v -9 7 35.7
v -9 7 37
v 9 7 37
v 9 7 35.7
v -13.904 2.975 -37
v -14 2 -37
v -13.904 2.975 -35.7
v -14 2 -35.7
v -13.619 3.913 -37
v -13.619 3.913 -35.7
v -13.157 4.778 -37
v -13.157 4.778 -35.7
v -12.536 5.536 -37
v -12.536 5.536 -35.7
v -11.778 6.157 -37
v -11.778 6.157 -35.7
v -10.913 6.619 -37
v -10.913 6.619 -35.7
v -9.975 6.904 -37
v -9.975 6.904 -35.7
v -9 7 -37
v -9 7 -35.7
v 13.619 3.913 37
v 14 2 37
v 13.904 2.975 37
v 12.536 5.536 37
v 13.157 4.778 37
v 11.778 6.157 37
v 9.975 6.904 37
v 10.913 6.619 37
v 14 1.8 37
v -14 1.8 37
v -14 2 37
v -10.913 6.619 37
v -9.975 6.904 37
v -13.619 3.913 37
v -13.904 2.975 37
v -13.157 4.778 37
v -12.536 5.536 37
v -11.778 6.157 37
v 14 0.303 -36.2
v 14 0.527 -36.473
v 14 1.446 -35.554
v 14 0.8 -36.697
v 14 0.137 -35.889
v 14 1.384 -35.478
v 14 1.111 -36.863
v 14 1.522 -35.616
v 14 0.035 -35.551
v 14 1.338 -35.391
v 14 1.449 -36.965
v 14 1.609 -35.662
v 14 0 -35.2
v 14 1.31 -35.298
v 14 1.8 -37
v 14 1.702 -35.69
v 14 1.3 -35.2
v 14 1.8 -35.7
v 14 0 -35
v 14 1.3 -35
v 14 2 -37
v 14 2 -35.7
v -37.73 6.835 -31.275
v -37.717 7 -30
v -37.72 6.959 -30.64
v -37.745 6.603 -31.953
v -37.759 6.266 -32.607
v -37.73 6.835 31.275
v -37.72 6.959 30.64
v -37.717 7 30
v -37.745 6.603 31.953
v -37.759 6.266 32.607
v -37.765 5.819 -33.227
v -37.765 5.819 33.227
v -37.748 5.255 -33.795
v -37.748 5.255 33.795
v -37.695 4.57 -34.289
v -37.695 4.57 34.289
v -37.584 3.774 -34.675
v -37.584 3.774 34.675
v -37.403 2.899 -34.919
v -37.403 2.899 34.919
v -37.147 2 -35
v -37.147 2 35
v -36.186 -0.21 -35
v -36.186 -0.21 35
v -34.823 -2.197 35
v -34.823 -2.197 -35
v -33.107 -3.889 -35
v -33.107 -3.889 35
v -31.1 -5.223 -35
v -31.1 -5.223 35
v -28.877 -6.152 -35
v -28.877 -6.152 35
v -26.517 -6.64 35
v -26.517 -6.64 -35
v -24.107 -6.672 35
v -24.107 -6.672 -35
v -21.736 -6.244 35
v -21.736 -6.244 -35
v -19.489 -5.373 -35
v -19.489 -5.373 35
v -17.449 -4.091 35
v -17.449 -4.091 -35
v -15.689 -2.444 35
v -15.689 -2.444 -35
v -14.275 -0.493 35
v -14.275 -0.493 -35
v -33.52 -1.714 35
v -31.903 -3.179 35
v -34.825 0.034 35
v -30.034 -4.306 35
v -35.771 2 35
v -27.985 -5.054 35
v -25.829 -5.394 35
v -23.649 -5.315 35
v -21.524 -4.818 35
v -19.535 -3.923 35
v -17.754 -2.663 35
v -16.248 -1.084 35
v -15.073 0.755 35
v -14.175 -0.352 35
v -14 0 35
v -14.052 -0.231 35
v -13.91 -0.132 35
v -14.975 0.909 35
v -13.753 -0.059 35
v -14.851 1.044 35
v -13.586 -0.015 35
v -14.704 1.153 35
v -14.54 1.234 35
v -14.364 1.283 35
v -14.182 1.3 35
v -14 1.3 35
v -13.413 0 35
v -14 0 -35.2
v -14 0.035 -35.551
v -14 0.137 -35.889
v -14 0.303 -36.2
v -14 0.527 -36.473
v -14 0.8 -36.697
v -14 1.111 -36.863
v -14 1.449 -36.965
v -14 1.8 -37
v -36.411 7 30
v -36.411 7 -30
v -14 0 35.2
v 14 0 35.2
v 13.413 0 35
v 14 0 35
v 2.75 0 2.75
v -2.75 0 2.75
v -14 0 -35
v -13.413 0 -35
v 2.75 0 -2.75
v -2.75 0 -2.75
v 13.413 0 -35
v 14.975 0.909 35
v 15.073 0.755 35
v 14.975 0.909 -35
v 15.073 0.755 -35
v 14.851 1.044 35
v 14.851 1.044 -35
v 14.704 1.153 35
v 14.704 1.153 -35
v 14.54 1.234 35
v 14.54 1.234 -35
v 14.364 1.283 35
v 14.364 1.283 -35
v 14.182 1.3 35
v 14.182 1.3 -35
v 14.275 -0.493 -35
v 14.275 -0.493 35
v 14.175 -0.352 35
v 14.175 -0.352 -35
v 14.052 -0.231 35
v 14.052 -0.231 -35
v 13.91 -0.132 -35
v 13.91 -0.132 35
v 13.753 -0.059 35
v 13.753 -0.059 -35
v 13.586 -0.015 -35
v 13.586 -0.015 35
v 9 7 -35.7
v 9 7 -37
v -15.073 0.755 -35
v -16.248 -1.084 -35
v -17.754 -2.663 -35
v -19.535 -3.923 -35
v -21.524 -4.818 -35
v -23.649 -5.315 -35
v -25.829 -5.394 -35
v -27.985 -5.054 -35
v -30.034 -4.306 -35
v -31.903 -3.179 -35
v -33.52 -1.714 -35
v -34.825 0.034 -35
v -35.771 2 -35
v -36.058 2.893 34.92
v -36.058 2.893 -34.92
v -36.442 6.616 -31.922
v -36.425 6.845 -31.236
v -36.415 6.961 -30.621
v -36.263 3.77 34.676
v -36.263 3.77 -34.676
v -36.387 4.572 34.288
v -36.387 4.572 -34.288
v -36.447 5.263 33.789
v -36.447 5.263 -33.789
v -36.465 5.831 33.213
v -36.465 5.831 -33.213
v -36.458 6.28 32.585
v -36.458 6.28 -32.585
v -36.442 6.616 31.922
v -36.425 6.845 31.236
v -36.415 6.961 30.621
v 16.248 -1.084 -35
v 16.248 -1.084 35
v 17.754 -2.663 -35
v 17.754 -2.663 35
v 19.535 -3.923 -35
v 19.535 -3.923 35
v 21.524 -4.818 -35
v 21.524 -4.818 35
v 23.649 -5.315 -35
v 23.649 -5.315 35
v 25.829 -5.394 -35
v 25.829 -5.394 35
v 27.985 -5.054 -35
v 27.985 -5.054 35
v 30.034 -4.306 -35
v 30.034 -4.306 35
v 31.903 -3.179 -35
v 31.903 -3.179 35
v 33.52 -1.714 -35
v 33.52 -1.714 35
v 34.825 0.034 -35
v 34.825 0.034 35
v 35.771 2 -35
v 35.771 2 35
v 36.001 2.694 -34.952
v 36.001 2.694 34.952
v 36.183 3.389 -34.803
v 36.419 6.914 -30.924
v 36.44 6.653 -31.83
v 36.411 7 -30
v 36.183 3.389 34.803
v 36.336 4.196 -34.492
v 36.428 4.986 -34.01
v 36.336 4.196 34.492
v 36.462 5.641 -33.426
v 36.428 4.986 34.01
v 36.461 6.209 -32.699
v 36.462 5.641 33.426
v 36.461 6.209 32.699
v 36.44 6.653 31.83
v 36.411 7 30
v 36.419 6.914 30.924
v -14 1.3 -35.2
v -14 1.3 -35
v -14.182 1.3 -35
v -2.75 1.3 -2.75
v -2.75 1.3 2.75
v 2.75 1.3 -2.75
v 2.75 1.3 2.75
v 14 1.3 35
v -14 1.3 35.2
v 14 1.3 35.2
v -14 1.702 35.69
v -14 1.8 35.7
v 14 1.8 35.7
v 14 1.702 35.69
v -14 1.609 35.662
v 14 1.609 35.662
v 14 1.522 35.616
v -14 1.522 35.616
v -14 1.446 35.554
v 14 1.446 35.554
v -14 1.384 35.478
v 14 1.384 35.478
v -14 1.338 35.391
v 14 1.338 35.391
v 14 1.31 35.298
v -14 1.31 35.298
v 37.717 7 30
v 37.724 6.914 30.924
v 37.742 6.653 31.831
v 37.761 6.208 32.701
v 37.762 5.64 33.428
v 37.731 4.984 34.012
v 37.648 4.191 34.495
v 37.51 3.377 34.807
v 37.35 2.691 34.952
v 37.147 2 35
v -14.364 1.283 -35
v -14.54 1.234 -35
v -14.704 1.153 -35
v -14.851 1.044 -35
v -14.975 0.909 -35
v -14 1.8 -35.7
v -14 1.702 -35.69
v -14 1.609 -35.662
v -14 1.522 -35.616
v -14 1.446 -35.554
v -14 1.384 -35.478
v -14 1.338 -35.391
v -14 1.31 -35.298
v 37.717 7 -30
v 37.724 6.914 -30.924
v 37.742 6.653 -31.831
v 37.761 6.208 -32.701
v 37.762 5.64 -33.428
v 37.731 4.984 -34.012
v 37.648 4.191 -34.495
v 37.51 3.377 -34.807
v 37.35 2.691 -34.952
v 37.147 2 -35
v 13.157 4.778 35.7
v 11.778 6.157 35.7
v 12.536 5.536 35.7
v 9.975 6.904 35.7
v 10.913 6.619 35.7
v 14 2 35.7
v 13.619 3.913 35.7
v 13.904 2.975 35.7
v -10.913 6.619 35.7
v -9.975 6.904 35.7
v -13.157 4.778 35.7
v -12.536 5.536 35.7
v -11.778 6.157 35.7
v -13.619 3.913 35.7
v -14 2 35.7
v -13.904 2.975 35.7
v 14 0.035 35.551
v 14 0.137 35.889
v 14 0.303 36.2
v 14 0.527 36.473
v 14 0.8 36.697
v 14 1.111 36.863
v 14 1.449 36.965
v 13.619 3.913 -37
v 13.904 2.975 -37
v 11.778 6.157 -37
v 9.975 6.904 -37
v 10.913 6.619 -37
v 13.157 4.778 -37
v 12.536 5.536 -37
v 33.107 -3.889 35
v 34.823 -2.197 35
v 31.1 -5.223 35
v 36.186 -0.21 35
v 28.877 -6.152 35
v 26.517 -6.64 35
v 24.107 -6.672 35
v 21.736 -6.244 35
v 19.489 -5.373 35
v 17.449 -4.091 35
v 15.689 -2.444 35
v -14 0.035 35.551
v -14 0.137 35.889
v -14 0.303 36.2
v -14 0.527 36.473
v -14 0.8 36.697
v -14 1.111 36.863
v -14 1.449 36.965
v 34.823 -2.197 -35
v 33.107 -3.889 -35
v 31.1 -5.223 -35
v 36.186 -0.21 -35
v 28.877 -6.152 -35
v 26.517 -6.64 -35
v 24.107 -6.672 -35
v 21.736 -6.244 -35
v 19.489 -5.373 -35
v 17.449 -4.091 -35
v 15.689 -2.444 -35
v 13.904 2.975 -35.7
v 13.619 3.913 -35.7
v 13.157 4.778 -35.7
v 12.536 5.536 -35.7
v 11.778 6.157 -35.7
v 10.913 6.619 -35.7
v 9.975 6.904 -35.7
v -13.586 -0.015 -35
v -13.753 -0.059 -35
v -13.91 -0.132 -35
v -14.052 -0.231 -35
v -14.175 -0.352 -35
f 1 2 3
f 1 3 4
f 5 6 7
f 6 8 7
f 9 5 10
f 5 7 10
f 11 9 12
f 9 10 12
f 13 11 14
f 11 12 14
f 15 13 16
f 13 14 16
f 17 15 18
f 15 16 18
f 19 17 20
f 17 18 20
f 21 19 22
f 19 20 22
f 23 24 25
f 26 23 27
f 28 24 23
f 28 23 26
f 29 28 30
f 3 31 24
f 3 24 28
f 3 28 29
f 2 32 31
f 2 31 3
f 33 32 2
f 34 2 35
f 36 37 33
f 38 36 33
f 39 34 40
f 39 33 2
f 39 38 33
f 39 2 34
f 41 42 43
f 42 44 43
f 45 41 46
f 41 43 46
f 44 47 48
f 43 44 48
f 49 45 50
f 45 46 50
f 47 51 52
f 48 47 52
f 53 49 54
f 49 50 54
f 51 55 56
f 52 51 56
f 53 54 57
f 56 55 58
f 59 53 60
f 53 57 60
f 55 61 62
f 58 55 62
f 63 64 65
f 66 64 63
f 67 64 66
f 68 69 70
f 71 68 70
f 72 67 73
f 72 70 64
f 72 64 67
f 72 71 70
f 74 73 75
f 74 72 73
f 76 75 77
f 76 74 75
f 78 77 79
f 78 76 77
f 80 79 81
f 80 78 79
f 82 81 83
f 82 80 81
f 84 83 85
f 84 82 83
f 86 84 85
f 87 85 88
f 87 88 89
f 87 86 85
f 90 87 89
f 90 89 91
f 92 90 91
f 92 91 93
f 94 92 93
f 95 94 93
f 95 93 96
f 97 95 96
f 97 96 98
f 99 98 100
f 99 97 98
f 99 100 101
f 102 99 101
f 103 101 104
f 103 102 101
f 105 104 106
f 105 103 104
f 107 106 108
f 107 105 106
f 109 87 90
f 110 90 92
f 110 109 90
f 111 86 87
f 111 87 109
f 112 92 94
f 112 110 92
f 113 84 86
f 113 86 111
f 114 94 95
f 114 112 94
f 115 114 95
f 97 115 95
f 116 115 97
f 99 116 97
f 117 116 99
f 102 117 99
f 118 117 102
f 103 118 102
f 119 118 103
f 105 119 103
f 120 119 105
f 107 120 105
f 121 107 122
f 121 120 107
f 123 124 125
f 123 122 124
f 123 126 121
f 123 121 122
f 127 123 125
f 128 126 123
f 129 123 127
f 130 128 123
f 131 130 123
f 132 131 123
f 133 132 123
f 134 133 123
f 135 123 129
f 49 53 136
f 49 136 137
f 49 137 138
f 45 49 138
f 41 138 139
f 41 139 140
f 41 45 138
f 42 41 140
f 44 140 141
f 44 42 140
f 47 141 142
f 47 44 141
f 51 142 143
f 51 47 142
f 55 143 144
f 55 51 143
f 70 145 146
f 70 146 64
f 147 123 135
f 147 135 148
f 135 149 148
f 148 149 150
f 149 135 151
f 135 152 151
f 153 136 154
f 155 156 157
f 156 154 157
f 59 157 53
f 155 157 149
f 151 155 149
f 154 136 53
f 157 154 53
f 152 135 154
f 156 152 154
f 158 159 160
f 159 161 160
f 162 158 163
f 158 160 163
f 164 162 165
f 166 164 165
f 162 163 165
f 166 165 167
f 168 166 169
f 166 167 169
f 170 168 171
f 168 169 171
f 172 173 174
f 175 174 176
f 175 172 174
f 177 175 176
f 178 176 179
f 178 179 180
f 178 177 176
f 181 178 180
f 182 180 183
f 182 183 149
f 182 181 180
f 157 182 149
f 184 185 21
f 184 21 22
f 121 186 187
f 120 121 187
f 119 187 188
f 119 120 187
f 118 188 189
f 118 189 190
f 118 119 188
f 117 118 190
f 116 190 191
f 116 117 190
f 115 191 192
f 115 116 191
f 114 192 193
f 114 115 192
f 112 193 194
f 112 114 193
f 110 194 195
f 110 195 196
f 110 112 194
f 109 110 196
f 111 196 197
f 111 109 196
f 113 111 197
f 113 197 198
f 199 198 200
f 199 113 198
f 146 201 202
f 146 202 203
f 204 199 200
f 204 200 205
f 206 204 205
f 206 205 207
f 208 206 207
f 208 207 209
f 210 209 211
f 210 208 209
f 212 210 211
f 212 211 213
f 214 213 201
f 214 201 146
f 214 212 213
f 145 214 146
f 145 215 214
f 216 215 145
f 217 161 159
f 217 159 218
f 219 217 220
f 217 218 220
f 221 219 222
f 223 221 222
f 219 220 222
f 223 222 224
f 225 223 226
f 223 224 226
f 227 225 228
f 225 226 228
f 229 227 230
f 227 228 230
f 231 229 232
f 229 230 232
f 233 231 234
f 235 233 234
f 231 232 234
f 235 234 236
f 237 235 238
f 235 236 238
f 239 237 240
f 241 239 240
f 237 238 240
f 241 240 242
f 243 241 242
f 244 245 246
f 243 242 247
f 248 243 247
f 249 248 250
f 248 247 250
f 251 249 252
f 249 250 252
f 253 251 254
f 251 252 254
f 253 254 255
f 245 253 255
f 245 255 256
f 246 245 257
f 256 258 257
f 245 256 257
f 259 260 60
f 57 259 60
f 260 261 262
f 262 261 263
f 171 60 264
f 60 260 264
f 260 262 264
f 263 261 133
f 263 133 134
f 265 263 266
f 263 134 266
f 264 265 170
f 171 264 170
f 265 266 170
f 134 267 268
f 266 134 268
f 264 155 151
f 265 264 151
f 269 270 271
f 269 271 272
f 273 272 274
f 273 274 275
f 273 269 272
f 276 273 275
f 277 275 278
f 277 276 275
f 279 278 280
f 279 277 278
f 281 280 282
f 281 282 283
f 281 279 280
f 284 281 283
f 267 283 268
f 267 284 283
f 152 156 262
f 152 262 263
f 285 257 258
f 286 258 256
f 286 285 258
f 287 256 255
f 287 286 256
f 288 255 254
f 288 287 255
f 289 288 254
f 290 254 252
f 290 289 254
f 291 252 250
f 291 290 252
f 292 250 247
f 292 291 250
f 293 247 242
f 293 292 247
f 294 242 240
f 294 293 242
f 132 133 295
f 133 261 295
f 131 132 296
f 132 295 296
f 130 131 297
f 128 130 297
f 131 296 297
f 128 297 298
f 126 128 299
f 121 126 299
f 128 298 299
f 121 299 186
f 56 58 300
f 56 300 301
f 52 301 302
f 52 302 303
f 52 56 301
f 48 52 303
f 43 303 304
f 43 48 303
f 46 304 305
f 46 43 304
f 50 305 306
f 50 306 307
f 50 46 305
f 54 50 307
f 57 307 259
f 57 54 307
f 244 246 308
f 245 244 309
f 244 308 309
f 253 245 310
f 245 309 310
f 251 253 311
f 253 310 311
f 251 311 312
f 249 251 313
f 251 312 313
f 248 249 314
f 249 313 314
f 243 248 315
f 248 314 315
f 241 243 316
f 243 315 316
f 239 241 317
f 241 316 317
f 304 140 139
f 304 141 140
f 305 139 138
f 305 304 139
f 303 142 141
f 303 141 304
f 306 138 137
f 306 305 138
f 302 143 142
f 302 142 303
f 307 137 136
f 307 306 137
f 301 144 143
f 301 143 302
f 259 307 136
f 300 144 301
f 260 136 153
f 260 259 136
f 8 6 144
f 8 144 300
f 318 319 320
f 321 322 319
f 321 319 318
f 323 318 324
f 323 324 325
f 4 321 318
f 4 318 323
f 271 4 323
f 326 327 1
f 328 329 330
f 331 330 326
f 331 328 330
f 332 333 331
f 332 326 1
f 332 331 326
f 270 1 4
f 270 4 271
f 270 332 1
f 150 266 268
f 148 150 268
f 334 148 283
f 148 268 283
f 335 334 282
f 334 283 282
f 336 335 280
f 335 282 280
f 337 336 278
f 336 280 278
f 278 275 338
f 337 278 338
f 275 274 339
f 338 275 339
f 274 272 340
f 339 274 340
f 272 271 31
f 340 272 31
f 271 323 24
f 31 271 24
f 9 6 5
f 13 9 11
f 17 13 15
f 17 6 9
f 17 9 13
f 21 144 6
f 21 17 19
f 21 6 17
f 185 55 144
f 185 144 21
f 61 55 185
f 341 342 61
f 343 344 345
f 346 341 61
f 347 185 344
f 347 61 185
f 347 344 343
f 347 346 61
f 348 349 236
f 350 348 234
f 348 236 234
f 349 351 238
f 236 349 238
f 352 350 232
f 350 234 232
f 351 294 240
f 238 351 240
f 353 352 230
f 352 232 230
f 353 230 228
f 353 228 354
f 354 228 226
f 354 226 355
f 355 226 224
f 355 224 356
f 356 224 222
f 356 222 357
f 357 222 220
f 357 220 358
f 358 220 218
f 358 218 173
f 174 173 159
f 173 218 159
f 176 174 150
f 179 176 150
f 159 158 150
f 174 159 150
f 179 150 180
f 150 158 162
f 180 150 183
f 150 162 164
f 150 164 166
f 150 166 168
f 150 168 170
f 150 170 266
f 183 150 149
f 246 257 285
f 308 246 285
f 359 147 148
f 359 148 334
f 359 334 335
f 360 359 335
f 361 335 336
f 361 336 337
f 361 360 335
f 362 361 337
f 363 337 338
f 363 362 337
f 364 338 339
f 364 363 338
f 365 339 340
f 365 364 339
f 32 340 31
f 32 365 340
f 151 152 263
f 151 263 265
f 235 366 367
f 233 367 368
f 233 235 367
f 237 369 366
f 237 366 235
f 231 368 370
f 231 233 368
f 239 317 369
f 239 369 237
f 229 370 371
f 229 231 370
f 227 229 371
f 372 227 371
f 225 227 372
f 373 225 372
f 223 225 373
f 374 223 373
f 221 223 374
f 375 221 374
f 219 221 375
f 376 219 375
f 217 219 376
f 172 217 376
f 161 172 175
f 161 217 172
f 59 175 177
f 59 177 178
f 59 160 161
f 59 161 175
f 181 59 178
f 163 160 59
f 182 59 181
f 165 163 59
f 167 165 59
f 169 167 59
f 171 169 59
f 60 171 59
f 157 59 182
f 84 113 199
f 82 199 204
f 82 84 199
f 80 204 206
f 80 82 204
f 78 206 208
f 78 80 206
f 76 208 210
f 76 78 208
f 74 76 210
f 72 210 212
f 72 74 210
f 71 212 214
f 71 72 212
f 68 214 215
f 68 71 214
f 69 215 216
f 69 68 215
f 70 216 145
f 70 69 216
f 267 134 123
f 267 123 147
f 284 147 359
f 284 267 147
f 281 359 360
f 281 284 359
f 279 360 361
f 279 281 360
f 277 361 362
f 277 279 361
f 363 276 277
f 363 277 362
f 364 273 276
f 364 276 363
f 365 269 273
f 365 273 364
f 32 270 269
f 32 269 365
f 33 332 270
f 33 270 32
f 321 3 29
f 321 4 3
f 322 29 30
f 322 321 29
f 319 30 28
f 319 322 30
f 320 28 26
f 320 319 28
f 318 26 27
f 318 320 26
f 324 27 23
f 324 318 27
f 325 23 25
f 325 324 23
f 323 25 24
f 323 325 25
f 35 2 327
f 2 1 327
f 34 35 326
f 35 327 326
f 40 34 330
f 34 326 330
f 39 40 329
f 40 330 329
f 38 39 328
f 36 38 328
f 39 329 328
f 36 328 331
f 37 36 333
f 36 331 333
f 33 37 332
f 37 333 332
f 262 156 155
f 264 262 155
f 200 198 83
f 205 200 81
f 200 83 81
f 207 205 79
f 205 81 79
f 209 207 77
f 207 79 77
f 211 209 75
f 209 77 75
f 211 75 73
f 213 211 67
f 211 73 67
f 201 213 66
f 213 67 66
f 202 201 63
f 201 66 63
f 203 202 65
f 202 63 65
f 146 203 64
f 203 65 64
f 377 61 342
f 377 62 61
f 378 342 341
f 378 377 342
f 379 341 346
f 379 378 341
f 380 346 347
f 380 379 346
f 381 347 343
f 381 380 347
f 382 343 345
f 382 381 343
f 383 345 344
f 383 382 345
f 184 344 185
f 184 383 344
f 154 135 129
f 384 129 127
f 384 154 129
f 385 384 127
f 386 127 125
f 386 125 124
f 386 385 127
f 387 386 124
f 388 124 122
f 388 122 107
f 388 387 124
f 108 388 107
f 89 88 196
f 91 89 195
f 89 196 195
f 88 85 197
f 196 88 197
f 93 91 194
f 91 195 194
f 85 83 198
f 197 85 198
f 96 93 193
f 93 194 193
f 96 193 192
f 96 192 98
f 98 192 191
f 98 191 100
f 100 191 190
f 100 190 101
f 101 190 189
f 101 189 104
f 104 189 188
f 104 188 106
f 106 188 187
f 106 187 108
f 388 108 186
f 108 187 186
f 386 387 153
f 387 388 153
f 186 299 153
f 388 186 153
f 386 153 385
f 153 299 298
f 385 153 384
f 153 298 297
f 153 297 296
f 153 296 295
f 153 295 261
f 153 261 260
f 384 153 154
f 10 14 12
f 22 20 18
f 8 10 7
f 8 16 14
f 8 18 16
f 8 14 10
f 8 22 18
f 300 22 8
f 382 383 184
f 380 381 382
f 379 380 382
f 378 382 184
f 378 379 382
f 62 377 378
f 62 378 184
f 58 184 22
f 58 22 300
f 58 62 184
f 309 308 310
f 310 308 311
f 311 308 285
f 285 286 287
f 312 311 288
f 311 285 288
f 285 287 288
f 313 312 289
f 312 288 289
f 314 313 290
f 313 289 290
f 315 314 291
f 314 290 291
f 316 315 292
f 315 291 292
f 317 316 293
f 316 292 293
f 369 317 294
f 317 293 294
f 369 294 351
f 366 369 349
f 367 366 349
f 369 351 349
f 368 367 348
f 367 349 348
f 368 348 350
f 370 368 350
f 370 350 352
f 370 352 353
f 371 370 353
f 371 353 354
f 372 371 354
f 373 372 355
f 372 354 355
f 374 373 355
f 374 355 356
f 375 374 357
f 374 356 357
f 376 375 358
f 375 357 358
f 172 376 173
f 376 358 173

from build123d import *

# Parameters (mm, degrees)
SKETCH1_W                      = 28
SKETCH1_H                      = 74
BOSS_EXTRUDE1_DEPTH            = 1.3
EDGE_FLANGE1_STRIP_W           = 6.2
EDGE_FLANGE1_STRIP_H           = 1.3
EDGE_FLANGE1_STRIP_CUT_DEPTH   = 28
EDGE_FLANGE1_STRIP_2_W         = 6.2
EDGE_FLANGE1_STRIP_2_H         = 1.3
EDGE_FLANGE1_STRIP_CUT_2_DEPTH = 28
EDGE_FLANGE1_DEPTH             = 28
EDGE_FLANGE1_BEND_DEPTH        = 28
FILLET1_R                      = 5
SKETCH16_W                     = 5.5
SKETCH16_H                     = 5.5
CUT_EXTRUDE1_DEPTH             = 41.174618853
BOSS_EXTRUDE2_DEPTH            = 35
FILLET2_R                      = 5
FILLET3_R                      = 1


# Sheet-metal steps are written as plain solids
with BuildPart() as part:
    # Sketch1 → Boss-Extrude1 (new body)
    with BuildSketch(Plane(origin=(0, 0, 0), x_dir=(1, 0, 0), z_dir=(0, 1, 0))):
        Rectangle(SKETCH1_W, SKETCH1_H)
    extrude(amount=BOSS_EXTRUDE1_DEPTH)

    # Edge-Flange1 strip (across the edge) → Edge-Flange1 strip cut (cut)
    with BuildSketch(Plane(origin=(14, 1.3, -37), x_dir=(0, 0, 1), z_dir=(-1, 0, 0))):
        with Locations((-1.3, -0.65)):
            Rectangle(EDGE_FLANGE1_STRIP_W, EDGE_FLANGE1_STRIP_H)
    extrude(amount=EDGE_FLANGE1_STRIP_CUT_DEPTH, mode=Mode.SUBTRACT)

    # Edge-Flange1 strip 2 (across the edge) → Edge-Flange1 strip cut 2 (cut)
    with BuildSketch(Plane(origin=(-14, 1.3, 37), x_dir=(0, 0, -1), z_dir=(1, 0, 0))):
        with Locations((-1.3, -0.65)):
            Rectangle(EDGE_FLANGE1_STRIP_2_W, EDGE_FLANGE1_STRIP_2_H)
    extrude(amount=EDGE_FLANGE1_STRIP_CUT_2_DEPTH, mode=Mode.SUBTRACT)

    # Edge-Flange1 section (across the edge) → Edge-Flange1 (add)
    with BuildSketch(Plane(origin=(14, 1.3, -37), x_dir=(0, 0, 1), z_dir=(-1, 0, 0))):
        with BuildLine():
            Line((0, 0.5), (0, 5.7))
            Line((0, 5.7), (1.3, 5.7))
            Line((1.3, 5.7), (1.3, 0.5))
            ThreePointArc((1.3, 0.5), (1.446446609, 0.146446609), (1.8, 0))
            Line((1.8, 0), (1.8, -1.3))
            ThreePointArc((1.8, -1.3), (0.527207794, -0.772792206), (0, 0.5))
        make_face()
    extrude(amount=EDGE_FLANGE1_DEPTH)

    # Edge-Flange1 section 2 (across the edge) → Edge-Flange1 bend (add)
    with BuildSketch(Plane(origin=(-14, 1.3, 37), x_dir=(0, 0, -1), z_dir=(1, 0, 0))):
        with BuildLine():
            Line((0, 0.5), (0, 5.7))
            Line((0, 5.7), (1.3, 5.7))
            Line((1.3, 5.7), (1.3, 0.5))
            ThreePointArc((1.3, 0.5), (1.446446609, 0.146446609), (1.8, 0))
            Line((1.8, 0), (1.8, -1.3))
            ThreePointArc((1.8, -1.3), (0.527207794, -0.772792206), (0, 0.5))
        make_face()
    extrude(amount=EDGE_FLANGE1_BEND_DEPTH)

    # Fillet1
    fillet1_edges = [part.edges().sort_by_distance(p)[0] for p in [
        (14, 7, -36.35),
        (-14, 7, -36.35),
        (-14, 7, 36.35),
        (14, 7, 36.35),
    ]]
    fillet(fillet1_edges, radius=FILLET1_R)

    # Sketch16 → Cut-Extrude1 (cut, through all)
    with BuildSketch(Plane.XZ):
        Rectangle(SKETCH16_W, SKETCH16_H)
    extrude(amount=-CUT_EXTRUDE1_DEPTH, mode=Mode.SUBTRACT)

    # Sketch17 → Boss-Extrude2 (add, symmetric)
    with BuildSketch(Plane.XY):
        with BuildLine():
            Line((-36.411176225, 7), (-37.716721927, 7))
            ThreePointArc((-37.716721927, 7), (-28.02937954, -6.381761823), (-13.403830412, 1.3))
            Line((-13.403830412, 1.3), (-14.812491114, 1.3))
            ThreePointArc((-14.812491114, 1.3), (-28.03717688, -5.040214789), (-36.411176225, 7))
        make_face()
    boss_extrude2 = extrude(amount=BOSS_EXTRUDE2_DEPTH, both=True)

    # Mirror1: Boss-Extrude2 across plane
    add(boss_extrude2.mirror(Plane(origin=(0, 0, 0), x_dir=(0, 0, 1), z_dir=(1, 0, 0))))

    # Fillet2
    fillet2_edges = [part.edges().sort_by_distance(p)[0] for p in [
        (-37.063949076, 7, -35),
        (-37.063949076, 7, 35),
        (37.063949076, 7, 35),
        (37.063949076, 7, -35),
    ]]
    fillet(fillet2_edges, radius=FILLET2_R)

    # Fillet3
    fillet3_edges = [part.edges().sort_by_distance(p)[0] for p in [
        (-14, 0, 0),
        (-14.812491114, 1.3, 0),
        (14, 0, 0),
        (14.812491114, 1.3, 0),
    ]]
    fillet(fillet3_edges, radius=FILLET3_R)


solid = part.part
